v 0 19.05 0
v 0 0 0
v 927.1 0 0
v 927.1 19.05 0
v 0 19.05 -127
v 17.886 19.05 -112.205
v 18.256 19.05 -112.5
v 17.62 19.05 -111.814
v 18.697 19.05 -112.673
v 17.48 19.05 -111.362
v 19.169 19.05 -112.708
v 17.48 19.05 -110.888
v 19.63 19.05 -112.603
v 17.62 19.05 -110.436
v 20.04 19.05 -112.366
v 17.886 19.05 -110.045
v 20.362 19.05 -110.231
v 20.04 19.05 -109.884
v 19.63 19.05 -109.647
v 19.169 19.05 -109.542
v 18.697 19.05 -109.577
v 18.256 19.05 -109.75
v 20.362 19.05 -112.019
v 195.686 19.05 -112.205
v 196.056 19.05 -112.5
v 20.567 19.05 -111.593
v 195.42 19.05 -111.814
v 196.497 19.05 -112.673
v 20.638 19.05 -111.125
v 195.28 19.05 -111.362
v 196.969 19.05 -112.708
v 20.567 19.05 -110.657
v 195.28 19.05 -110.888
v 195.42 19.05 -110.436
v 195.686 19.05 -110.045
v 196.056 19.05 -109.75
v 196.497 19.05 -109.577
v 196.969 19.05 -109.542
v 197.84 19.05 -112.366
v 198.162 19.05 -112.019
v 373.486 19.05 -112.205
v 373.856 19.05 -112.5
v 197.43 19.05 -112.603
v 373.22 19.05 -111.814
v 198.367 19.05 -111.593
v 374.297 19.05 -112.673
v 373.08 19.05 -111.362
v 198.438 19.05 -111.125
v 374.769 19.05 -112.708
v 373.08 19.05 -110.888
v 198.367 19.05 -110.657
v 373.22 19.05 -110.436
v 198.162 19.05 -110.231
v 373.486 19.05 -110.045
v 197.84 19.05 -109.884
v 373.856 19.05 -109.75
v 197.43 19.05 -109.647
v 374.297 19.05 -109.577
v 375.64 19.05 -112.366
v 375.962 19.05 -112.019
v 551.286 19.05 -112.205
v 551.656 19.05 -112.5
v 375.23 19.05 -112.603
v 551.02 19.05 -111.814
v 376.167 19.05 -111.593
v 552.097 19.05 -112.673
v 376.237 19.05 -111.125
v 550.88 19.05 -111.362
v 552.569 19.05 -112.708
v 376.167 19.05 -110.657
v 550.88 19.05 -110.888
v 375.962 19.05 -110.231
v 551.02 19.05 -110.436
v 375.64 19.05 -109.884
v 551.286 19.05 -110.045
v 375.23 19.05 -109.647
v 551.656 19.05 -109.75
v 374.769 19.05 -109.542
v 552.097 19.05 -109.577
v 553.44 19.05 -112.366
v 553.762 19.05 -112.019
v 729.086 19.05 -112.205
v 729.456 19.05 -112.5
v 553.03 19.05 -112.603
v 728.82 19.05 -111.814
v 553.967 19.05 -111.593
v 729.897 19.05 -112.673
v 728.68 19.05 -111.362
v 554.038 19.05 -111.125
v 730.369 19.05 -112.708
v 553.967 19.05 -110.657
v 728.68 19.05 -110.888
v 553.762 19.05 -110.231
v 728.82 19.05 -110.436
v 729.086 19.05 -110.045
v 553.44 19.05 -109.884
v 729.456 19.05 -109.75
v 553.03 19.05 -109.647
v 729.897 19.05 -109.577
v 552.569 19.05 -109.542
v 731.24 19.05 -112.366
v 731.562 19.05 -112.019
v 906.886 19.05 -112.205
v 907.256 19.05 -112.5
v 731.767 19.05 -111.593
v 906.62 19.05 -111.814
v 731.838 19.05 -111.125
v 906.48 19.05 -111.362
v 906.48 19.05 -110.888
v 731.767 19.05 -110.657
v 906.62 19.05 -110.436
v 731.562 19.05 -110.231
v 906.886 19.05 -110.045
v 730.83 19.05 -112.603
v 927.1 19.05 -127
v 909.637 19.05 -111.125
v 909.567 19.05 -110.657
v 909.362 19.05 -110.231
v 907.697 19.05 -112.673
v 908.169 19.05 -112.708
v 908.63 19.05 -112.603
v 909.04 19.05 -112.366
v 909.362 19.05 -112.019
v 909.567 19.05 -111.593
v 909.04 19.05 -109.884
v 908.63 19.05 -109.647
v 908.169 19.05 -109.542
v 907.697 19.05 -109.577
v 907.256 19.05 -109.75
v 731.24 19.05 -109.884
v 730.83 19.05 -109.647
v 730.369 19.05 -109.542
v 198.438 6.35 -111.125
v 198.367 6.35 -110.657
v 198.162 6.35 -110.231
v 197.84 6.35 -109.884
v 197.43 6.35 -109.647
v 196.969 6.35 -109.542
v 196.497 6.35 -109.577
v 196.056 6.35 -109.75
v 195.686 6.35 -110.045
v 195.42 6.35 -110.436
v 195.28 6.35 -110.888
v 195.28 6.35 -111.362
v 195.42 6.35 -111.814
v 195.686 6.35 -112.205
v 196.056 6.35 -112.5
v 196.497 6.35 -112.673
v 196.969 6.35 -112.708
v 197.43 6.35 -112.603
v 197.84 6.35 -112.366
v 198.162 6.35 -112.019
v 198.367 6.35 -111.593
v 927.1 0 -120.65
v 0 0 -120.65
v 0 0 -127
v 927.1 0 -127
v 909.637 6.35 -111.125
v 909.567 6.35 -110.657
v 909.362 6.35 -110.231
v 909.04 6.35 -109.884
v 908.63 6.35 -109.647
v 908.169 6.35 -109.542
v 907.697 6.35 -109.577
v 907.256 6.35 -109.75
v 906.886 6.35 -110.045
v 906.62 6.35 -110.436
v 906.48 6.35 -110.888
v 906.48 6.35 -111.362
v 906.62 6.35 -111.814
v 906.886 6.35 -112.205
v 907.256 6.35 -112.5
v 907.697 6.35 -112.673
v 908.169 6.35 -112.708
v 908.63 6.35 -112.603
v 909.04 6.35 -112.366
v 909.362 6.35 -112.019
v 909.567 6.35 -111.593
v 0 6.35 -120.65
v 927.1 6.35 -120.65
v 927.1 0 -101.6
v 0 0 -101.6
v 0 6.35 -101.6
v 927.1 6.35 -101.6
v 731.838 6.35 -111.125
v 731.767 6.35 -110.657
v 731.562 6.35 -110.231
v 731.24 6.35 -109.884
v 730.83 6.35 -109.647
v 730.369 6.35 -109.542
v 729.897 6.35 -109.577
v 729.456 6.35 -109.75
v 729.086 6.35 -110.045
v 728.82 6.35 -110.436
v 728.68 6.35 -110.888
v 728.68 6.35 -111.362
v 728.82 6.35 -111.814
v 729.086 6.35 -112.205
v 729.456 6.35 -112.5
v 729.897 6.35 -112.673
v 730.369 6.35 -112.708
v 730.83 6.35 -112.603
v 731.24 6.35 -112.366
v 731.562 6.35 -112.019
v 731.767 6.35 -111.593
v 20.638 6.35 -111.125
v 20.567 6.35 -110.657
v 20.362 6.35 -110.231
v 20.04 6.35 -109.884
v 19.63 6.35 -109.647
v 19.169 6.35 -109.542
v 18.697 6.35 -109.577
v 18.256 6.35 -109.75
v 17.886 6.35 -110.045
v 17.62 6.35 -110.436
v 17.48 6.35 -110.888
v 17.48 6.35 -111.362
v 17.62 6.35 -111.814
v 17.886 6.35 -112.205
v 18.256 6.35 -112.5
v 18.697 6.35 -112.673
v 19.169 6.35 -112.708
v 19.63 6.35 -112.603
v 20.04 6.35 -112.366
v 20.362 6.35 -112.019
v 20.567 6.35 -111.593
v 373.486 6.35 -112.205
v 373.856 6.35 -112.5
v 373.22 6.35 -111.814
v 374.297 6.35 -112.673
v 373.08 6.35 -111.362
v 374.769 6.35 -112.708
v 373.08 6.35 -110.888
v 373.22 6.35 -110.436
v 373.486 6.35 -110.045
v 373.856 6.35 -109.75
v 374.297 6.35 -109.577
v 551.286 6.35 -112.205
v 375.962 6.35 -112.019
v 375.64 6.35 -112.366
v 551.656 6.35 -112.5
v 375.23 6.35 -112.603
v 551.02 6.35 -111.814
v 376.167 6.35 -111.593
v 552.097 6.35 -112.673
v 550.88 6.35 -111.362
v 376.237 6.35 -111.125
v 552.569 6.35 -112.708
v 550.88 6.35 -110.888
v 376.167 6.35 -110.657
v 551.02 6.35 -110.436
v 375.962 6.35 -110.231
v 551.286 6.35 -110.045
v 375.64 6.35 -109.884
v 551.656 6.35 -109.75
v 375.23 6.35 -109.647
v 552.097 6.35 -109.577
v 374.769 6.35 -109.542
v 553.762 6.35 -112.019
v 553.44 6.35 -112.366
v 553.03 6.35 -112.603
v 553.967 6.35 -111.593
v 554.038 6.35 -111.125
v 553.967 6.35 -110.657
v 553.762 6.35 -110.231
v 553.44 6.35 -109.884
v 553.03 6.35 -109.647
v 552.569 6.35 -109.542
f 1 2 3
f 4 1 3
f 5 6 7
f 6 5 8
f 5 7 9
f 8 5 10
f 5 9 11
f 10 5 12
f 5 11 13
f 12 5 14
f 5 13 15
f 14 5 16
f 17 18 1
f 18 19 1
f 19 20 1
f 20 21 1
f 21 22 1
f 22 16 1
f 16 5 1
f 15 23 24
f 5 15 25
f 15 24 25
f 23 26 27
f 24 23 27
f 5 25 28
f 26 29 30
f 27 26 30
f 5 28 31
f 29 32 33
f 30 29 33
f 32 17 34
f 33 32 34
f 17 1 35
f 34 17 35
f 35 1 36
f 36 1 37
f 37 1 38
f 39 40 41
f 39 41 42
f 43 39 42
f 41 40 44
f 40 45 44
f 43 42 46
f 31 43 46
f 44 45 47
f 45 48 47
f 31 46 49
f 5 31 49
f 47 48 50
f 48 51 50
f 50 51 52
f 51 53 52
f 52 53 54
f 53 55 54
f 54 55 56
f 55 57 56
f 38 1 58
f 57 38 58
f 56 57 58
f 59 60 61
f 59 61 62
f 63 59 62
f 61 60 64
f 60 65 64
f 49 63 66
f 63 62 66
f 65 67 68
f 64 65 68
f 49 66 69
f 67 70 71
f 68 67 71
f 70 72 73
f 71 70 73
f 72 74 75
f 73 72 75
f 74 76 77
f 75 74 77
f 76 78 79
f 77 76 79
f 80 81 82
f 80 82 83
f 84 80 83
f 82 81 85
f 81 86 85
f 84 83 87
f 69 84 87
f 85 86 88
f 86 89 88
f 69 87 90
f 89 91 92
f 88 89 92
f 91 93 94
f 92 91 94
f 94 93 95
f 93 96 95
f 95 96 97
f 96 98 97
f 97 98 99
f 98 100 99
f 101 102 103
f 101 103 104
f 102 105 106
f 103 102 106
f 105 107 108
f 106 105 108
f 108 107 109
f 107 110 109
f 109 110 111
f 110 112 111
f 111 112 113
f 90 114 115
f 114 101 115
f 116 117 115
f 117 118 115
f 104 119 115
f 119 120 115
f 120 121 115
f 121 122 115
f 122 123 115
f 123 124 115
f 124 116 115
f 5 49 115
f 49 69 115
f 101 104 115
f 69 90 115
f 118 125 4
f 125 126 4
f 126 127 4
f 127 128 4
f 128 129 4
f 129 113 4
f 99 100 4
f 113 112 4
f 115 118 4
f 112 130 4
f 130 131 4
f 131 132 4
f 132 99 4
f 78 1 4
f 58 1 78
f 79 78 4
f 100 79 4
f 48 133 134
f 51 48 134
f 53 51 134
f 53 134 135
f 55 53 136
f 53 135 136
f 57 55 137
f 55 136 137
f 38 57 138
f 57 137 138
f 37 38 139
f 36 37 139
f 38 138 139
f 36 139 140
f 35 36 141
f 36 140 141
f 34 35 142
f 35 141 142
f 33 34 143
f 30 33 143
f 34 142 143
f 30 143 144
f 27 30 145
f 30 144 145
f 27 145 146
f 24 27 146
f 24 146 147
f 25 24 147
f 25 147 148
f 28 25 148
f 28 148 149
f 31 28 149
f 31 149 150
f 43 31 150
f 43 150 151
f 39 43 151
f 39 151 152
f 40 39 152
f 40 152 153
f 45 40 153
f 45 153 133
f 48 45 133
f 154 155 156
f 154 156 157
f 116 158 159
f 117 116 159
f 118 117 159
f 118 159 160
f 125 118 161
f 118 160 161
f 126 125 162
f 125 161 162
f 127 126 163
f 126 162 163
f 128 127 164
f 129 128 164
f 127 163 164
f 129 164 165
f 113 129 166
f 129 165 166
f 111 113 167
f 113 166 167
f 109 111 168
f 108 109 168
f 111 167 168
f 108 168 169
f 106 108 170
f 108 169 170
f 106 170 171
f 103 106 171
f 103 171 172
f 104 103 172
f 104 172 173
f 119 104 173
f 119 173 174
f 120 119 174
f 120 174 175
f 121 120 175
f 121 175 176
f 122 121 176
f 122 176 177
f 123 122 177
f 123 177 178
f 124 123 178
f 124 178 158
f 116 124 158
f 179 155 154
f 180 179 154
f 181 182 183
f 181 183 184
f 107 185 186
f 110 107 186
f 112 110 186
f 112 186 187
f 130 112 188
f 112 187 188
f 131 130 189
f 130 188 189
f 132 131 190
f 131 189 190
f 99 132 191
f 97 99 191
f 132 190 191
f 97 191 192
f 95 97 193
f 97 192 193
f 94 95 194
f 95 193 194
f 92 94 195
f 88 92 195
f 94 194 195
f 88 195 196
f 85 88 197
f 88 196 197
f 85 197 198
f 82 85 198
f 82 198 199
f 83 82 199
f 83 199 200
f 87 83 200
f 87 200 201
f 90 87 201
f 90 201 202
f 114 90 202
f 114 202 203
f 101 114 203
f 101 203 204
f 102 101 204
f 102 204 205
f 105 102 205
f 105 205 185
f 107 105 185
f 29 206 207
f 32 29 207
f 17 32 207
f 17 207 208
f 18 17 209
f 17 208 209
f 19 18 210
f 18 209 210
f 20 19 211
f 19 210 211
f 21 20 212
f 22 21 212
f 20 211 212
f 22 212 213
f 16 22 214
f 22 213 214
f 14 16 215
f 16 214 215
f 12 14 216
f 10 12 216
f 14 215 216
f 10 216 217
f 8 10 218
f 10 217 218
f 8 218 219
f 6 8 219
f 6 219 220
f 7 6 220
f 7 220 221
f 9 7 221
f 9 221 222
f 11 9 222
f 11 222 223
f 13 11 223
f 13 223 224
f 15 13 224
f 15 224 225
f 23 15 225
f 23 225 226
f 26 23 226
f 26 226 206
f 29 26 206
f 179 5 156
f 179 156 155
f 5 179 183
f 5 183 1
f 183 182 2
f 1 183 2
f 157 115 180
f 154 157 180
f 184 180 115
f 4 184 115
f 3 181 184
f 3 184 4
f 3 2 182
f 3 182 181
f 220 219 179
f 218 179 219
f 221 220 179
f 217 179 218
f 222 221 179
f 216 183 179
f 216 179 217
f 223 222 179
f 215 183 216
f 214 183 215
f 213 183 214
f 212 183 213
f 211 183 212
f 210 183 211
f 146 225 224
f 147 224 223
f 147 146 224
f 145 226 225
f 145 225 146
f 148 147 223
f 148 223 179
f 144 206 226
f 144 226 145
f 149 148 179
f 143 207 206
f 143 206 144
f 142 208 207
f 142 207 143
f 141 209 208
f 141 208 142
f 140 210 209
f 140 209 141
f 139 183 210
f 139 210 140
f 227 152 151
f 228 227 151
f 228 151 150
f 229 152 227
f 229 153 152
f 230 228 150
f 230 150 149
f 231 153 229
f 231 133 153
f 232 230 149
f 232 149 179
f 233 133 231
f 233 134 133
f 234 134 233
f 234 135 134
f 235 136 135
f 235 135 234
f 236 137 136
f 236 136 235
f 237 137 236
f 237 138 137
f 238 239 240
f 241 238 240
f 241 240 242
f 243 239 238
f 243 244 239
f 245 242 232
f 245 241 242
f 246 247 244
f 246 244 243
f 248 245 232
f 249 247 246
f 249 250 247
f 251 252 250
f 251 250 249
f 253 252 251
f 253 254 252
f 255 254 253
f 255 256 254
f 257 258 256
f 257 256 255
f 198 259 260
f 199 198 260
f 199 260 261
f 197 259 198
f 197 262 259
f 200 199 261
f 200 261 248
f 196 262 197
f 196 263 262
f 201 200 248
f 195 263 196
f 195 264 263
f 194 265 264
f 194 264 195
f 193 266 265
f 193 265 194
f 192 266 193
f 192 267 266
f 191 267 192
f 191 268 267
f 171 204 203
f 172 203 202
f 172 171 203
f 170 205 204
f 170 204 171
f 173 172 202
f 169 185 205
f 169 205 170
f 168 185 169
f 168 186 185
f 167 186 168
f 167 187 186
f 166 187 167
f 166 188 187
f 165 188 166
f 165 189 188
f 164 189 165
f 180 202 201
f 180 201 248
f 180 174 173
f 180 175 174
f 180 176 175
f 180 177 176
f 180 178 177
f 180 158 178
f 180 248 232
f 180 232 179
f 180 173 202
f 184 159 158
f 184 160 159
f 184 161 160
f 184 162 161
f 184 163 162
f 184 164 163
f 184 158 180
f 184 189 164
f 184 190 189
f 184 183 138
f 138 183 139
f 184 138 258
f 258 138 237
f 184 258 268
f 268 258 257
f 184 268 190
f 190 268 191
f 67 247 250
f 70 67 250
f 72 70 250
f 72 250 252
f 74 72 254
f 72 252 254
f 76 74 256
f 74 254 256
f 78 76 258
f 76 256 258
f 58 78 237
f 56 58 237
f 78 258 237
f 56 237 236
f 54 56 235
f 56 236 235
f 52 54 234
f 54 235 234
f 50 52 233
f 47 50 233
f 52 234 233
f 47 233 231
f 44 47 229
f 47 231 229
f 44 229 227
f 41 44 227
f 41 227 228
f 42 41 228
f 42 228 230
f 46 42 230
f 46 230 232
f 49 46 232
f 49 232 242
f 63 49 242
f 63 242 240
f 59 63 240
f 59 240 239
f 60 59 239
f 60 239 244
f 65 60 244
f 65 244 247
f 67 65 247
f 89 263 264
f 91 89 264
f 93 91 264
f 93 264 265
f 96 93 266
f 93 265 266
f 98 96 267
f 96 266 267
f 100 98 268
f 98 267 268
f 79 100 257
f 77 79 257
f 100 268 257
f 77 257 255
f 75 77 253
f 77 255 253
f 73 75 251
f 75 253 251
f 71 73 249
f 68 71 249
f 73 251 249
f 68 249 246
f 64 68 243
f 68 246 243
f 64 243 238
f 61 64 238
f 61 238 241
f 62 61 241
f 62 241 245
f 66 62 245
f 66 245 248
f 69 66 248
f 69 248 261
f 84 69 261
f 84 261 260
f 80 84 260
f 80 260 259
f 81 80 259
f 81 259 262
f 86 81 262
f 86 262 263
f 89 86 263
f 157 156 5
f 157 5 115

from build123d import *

# Parameters (mm, degrees)
F0_W     = 927.1
F0_H     = 127
F1_DEPTH = 19.05
F2_W     = 927.1
F2_H     = 19.05
F3_DEPTH = 6.35
F4_R     = 1.5875
F5_DEPTH = 19.051


with BuildPart() as f1:
    # F0 (on Front) → F1 (new body)
    with BuildSketch(Plane.XZ):
        with Locations((463.55, -63.5)):
            Rectangle(F0_W, F0_H)
    extrude(amount=-F1_DEPTH)

    # F2 (on Front) → F3 (cut)
    with BuildSketch(Plane.XZ):
        with Locations((463.55, -111.125)):
            Rectangle(F2_W, F2_H)
    extrude(amount=-F3_DEPTH, mode=Mode.SUBTRACT)

    # F4 (on Front) → F5 (cut, through all)
    with BuildSketch(Plane.XZ):
        with Locations((19.05, -111.125)):
            Circle(F4_R)
        with Locations((196.85, -111.125)):
            Circle(F4_R)
        with Locations((374.65, -111.125)):
            Circle(F4_R)
        with Locations((552.45, -111.125)):
            Circle(F4_R)
        with Locations((730.25, -111.125)):
            Circle(F4_R)
        with Locations((908.05, -111.125)):
            Circle(F4_R)
    extrude(amount=-F5_DEPTH, mode=Mode.SUBTRACT)


solid = f1.part
